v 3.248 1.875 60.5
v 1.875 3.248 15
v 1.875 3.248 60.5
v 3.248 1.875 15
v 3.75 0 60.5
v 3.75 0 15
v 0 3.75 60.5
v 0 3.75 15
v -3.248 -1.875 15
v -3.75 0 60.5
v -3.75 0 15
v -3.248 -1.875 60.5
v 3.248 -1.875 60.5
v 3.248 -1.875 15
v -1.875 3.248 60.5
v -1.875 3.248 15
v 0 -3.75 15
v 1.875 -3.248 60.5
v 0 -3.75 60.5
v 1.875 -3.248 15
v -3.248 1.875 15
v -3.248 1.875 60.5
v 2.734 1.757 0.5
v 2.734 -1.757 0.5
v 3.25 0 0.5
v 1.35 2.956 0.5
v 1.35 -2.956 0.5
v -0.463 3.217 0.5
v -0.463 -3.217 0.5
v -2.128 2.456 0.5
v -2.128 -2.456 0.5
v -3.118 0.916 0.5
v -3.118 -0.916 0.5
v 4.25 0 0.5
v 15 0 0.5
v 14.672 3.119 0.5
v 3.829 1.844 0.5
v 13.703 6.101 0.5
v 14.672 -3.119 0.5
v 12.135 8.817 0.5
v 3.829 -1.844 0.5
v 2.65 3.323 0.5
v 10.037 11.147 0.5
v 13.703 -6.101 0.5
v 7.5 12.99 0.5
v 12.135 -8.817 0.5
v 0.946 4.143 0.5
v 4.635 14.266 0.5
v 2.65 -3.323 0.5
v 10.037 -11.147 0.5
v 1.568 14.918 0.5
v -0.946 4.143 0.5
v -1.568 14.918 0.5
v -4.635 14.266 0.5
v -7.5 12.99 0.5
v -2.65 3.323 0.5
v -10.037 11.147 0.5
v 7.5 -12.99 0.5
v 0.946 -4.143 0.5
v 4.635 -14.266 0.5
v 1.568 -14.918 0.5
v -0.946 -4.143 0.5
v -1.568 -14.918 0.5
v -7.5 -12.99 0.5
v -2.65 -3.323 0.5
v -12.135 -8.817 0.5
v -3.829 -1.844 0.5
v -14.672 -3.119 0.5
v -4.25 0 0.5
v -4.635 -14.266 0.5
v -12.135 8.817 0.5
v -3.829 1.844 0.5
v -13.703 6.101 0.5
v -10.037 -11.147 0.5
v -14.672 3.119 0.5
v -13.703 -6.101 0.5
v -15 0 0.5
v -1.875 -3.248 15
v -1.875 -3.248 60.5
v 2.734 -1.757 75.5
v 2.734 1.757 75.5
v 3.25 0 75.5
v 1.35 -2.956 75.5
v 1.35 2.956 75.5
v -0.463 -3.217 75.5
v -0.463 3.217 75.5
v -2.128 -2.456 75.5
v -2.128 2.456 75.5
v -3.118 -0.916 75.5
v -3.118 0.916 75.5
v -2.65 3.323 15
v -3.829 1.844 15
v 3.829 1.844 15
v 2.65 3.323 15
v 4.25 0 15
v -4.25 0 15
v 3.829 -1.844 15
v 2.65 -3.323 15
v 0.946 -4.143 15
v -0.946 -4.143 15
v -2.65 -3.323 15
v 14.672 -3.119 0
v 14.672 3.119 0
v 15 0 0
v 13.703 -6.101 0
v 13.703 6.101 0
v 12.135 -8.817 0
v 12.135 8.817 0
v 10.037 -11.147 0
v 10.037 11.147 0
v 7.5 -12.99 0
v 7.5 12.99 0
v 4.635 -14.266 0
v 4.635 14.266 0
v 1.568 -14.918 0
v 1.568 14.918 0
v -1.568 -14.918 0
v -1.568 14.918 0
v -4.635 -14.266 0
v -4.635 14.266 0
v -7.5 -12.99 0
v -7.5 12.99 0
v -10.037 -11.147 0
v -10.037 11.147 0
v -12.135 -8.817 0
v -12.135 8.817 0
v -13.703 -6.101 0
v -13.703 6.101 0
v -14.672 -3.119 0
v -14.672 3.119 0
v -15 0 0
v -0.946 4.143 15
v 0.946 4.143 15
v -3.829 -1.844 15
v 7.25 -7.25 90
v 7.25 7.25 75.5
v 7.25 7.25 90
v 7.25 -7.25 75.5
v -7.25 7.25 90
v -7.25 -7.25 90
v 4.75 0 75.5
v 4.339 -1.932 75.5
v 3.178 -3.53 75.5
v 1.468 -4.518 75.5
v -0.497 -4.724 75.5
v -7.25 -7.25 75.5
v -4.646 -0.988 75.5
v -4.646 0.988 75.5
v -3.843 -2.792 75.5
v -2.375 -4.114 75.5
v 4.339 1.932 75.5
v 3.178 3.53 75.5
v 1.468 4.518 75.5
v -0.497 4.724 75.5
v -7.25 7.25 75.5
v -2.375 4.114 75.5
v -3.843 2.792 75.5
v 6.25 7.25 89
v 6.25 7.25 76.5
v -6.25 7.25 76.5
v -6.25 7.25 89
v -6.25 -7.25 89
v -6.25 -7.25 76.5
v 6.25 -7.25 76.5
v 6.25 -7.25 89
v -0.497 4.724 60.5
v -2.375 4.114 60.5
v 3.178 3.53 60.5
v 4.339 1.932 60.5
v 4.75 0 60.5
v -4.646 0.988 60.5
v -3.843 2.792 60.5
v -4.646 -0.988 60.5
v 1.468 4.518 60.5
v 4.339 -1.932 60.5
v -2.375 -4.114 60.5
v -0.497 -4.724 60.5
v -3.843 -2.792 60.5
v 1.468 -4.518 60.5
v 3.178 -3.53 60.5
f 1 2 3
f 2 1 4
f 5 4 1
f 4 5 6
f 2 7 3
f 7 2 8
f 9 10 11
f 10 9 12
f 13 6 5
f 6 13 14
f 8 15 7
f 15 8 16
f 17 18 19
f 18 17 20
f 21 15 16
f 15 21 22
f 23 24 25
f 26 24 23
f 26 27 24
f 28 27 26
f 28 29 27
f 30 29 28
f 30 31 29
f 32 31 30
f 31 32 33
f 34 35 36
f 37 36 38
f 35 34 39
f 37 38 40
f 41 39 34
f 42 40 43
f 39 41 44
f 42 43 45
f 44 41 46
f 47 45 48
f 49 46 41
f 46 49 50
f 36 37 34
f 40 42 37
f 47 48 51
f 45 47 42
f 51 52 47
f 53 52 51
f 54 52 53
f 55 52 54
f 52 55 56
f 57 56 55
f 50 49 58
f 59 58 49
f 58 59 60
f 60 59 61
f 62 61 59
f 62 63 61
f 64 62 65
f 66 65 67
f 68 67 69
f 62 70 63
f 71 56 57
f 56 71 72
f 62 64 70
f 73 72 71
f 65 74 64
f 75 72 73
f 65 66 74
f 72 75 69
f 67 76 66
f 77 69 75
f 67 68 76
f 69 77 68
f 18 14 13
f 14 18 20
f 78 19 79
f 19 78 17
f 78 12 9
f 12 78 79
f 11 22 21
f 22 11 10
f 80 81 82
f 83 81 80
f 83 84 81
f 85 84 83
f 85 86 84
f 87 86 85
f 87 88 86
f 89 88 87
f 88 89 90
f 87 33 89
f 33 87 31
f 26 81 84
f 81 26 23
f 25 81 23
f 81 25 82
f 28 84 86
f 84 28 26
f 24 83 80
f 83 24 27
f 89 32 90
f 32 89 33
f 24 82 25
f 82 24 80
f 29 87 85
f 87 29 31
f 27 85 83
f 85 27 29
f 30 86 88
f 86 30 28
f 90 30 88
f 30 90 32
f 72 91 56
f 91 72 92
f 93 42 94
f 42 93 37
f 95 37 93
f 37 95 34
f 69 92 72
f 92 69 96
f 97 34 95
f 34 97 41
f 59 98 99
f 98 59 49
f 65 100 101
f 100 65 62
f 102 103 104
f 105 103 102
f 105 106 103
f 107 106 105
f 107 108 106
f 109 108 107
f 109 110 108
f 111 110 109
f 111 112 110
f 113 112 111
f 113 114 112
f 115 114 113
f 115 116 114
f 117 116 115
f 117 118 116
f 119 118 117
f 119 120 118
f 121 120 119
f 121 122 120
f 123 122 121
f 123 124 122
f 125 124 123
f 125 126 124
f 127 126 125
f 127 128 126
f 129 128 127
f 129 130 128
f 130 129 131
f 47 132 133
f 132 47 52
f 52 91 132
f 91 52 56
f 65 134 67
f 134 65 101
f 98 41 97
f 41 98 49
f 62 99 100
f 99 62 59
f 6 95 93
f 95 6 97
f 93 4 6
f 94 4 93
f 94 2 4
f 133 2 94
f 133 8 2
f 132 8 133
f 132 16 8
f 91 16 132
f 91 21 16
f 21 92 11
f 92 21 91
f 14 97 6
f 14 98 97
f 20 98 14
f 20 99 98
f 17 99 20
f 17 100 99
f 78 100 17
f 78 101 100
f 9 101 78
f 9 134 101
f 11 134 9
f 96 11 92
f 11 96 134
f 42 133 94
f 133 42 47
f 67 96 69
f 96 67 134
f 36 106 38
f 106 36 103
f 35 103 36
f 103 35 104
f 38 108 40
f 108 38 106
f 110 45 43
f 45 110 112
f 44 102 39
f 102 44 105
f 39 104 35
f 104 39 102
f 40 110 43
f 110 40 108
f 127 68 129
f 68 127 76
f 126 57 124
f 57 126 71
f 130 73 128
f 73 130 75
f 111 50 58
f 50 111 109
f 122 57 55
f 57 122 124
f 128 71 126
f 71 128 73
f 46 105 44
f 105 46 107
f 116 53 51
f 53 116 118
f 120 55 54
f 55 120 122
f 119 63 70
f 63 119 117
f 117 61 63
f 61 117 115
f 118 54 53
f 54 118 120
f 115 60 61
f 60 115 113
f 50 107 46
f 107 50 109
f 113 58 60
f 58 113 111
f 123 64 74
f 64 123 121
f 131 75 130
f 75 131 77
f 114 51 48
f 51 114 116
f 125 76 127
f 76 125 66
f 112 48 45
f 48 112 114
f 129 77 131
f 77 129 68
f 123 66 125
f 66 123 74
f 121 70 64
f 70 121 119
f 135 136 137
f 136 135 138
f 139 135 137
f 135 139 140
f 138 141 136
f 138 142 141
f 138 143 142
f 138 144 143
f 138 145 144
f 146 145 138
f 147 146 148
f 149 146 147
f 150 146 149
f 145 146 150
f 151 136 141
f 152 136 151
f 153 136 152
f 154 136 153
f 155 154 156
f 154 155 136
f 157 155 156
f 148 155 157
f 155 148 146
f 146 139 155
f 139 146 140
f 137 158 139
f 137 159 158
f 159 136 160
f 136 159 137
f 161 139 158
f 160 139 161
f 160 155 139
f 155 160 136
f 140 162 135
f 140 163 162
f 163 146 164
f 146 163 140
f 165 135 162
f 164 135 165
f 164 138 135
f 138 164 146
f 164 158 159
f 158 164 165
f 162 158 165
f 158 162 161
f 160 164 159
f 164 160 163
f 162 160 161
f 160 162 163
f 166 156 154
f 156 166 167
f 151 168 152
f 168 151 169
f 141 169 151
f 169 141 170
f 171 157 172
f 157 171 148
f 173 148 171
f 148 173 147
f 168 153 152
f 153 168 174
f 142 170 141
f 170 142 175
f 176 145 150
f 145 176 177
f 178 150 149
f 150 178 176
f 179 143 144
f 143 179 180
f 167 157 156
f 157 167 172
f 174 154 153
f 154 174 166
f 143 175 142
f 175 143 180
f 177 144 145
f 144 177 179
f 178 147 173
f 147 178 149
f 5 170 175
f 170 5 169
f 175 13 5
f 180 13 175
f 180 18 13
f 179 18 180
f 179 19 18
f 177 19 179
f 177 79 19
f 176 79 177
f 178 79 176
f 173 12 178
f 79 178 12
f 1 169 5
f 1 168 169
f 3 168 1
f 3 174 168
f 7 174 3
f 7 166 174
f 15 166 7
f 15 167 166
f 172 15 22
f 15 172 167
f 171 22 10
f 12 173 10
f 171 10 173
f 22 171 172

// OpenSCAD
// file: landing-gear-foot.scad
include<../../vars.scad>

module landingGearFoot(){
    color(plaColor) cylinder(h = landingGearFootThickness, d = landingGearFootDia);
    difference(){
        color(plaColor) cylinder(h = landingGearFootSocketHeight, d = landingGearFootSocketWallThickness * 2 + landingGearLegDia);
        cylinder(h = landingGearFootSocketHeight + 1, d = landingGearLegDia);
    };
};

landingGearFoot();
// file: landing-gear-leg.scad
include<../../vars.scad>

module landingGearLeg(){
    difference(){    
        color(carbonColor) cylinder(h = landingGearLegLength, d = landingGearLegDia);
        translate([0, 0, -0.5]) cylinder(h = landingGearLegLength + 1, d = landingGearLegDia - landingGearLegWallThickness * 2);
    };
};

landingGearLeg();
// file: landing-gear-bracket.scad
include<../../vars.scad>

module landingGearBracket() {
    translate([(-armBoxWidth / 2) - landingGearBracketWallThickness, (-armBoxWidth / 2) - landingGearBracketSocketWallThickness, (-armBoxWidth / 2) -landingGearBracketSocketWallThickness]) difference(){
        color(plaColor) cube(armBoxWidth + landingGearBracketWallThickness * 2);
        translate([landingGearBracketWallThickness, -landingGearBracketWallThickness + 0.5, landingGearBracketWallThickness]) cube([armBoxWidth, armBoxWidth + (landingGearBracketWallThickness * 2) + 1, armBoxWidth]);
    };
    translate([0, 0, ((-armBoxWidth / 2) - landingGearBracketWallThickness) - landingGearBracketSocketHeight]) difference(){
        color(plaColor)
        cylinder(h = landingGearBracketSocketHeight, d = (landingGearBracketSocketWallThickness * 2) + landingGearLegDia);

        translate([0, 0, -0.5])
        cylinder(h = landingGearBracketSocketHeight + 1, d = landingGearLegDia);
    };
};

landingGearBracket();
// file: ../../vars.scad
// style
carbonColor = "#3e4042";
plaColor = "#00ff00";


// arms
armLength = 500;
armBoxWidth = 12.5;
armBoxWallThickness = 0.5;
armFixingHoleDia = 4;

// central brackets
centralBracketWallThickness = 1;
centralBracketDepth = armBoxWidth / 2;

centralBracketTopPlateSize = 100;
centralBracketTopPlateThickness = 1;

centralBracketPlateSize = 50;
centralBracketPlateThickness = 1;

// landing gear
landingGearSpacing = 175;

landingGearLegLength = 75;
landingGearLegDia = 7.5;
landingGearLegWallThickness = 0.5;

landingGearFootThickness = 0.5;
landingGearFootDia = 30;
landingGearFootSocketHeight = 15;
landingGearFootSocketWallThickness = 0.5;

landingGearBracketWallThickness = 1;
landingGearBracketSocketWallThickness = 1;
landingGearBracketSocketHeight = 15;
// main file
include<../../vars.scad>
use<landing-gear-bracket.scad>
use<landing-gear-leg.scad>
use<landing-gear-foot.scad>

module landingGear(){
    translate([0, 0, landingGearFootThickness])
    landingGearLeg();

    landingGearFoot();

    translate([0, 0, landingGearLegLength + landingGearFootThickness + (armBoxWidth / 2) + landingGearBracketWallThickness])
    landingGearBracket();
};

landingGear();
